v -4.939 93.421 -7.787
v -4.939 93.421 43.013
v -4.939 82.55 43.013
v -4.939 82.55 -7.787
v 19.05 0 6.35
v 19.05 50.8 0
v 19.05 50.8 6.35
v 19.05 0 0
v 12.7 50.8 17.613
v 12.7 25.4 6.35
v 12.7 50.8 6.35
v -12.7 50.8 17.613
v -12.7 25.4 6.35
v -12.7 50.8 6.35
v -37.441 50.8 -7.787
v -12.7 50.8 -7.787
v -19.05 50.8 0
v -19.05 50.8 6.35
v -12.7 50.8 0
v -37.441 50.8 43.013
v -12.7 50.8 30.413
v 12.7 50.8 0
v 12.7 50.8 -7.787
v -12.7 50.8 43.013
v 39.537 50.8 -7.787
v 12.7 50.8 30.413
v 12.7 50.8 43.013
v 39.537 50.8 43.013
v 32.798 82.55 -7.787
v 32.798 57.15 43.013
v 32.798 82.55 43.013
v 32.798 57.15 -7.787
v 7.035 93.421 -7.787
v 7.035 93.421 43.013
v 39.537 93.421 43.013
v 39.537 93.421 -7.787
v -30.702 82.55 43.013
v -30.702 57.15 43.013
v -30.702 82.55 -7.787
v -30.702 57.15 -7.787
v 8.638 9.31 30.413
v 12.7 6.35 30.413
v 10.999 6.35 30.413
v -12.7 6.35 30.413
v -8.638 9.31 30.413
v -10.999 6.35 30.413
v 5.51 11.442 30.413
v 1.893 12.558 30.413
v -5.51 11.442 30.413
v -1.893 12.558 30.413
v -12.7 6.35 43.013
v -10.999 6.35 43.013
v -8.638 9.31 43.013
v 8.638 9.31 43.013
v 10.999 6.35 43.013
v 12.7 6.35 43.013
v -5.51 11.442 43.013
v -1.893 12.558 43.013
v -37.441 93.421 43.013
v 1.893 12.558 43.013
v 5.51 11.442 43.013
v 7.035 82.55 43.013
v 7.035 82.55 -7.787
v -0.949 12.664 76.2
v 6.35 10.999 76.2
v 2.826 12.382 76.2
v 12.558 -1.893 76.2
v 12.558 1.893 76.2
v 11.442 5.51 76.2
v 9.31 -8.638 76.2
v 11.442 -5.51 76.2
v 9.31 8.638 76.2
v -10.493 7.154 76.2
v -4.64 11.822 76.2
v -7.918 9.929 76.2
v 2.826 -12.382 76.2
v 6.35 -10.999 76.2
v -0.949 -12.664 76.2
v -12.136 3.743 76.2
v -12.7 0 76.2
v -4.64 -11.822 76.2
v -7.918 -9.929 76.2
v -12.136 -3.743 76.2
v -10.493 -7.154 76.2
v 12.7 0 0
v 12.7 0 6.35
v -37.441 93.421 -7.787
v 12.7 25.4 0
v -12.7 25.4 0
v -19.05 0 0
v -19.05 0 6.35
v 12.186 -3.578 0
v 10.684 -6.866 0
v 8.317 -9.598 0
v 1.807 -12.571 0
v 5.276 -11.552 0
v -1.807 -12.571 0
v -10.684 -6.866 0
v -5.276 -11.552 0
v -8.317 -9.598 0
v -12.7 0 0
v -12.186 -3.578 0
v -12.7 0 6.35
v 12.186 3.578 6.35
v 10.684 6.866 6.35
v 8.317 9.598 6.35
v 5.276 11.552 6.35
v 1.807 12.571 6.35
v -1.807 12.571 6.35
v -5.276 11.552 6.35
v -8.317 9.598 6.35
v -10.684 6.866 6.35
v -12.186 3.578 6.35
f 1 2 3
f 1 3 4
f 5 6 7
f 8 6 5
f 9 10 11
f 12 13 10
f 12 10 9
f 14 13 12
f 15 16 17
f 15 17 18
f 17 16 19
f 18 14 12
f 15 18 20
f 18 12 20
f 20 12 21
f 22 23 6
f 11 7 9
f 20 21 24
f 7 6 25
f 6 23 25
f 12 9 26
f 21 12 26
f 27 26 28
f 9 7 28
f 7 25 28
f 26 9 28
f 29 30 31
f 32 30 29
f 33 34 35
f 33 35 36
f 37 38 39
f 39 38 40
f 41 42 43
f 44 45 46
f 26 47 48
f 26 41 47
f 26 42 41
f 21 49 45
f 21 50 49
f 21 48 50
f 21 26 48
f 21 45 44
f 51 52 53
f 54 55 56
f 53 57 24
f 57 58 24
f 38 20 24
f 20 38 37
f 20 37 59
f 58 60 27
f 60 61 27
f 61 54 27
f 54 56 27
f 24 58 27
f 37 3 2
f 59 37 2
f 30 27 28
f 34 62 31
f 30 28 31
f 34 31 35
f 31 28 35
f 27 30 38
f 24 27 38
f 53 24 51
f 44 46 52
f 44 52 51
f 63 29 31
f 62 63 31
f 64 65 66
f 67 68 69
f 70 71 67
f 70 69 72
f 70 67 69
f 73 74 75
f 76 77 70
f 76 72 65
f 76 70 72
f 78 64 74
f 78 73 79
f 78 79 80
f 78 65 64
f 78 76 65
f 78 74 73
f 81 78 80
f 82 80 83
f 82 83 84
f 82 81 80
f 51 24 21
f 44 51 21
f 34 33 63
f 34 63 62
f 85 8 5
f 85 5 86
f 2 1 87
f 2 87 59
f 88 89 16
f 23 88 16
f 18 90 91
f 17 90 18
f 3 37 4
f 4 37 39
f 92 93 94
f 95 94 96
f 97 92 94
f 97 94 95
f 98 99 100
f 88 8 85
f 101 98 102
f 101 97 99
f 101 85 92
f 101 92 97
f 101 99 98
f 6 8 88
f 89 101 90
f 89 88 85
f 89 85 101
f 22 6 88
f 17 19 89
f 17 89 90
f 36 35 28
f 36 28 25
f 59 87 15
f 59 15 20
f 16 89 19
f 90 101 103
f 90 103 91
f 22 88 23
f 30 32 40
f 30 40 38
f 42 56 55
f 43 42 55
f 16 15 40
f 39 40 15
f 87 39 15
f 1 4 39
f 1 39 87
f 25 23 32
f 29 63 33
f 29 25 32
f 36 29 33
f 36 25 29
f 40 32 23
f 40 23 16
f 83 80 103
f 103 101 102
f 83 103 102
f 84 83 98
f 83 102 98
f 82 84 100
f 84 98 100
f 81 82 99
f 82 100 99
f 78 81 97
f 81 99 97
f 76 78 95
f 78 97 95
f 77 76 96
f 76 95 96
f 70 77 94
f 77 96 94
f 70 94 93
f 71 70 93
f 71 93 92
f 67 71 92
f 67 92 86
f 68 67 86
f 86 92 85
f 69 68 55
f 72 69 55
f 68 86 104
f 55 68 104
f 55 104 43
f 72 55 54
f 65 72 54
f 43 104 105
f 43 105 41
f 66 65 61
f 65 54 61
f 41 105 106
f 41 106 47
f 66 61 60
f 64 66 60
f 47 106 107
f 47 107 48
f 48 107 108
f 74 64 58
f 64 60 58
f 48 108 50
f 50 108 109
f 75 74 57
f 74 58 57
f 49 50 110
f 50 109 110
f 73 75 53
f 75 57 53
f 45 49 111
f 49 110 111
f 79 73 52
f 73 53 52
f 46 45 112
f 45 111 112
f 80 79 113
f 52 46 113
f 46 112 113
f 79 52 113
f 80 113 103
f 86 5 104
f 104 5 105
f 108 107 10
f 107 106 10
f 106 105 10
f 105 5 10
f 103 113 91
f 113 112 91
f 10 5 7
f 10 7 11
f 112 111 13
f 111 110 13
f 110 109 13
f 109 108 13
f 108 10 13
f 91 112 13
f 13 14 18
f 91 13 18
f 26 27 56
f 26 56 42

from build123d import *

# Parameters (mm, degrees)
SKETCH3_R            = 12.7
BOSS_EXTRUDE1_DEPTH  = 76.2
BOSS_EXTRUDE2_DEPTH  = 6.35
SKETCH6_W            = 63.5
SKETCH6_H            = 50.8
BOSS_EXTRUDE3_DEPTH  = 6.35
SKETCH9_W            = 50.8
SKETCH9_H            = 6.35
BOSS_EXTRUDE4_DEPTH  = 0.38862
SKETCH10_W           = 0.38862
SKETCH10_H           = 50.8
BOSS_EXTRUDE5_DEPTH  = 25.4
SKETCH11_W           = 50.8
SKETCH11_H           = 6.35
BOSS_EXTRUDE6_DEPTH  = 0.38862
SKETCH13_W           = 0.38862
SKETCH13_H           = 50.8
BOSS_EXTRUDE7_DEPTH  = 25.4
SKETCH14_W           = 0.38862
SKETCH14_H           = 50.8
BOSS_EXTRUDE8_DEPTH  = 10.8712
SKETCH15_W           = 50.8
SKETCH15_H           = 10.8712
BOSS_EXTRUDE9_DEPTH  = 25.76322
SKETCH16_W           = 0.38862
SKETCH16_H           = 50.8
BOSS_EXTRUDE10_DEPTH = 10.8712
SKETCH17_W           = 50.8
SKETCH17_H           = 10.8712
BOSS_EXTRUDE11_DEPTH = 25.76322
RIB4_REACH           = 127.041
SKETCH21_WALL_W      = 279.8678728
SKETCH21_WALL_H      = 25.4
RIB15_REACH          = 127.041
SKETCH22_WALL_W      = 278.64922185
SKETCH22_WALL_H      = 25.4
SKETCH26_W           = 25.4
SKETCH26_H           = 12.600318116
BOSS_EXTRUDE12_DEPTH = 44.45
SKETCH27_W           = 50.8
SKETCH27_H           = 42.6212
BOSS_EXTRUDE13_DEPTH = 6.35
SKETCH28_W           = 50.8
SKETCH28_H           = 42.6212
BOSS_EXTRUDE14_DEPTH = 6.35


with BuildPart() as part:
    # Sketch3 → Boss-Extrude1 (new body)
    with BuildSketch(Plane.XY):
        with Locations(Location((0, 0, 0), (0, 0, 180))):
            Circle(SKETCH3_R)
    extrude(amount=BOSS_EXTRUDE1_DEPTH)

    # Sketch4 → Boss-Extrude2 (add)
    with BuildSketch(Plane(origin=(0, 0, 0), x_dir=(-1, 0, 0), z_dir=(0, 0, -1))):
        Polygon((0, 0), (19.05, 0), (19.05, 50.8), (-19.05, 50.8), (-19.05, 0), align=None)
    extrude(amount=-BOSS_EXTRUDE2_DEPTH)

    # Sketch6 → Boss-Extrude3 (add)
    with BuildSketch(Plane(origin=(0, 50.8, 0), x_dir=(1, 0, 0), z_dir=(0, 1, 0))):
        with Locations((1.04805825, -17.613482739)):
            Rectangle(SKETCH6_W, SKETCH6_H)
    extrude(amount=BOSS_EXTRUDE3_DEPTH)

    # Sketch9 → Boss-Extrude4 (add)
    with BuildSketch(Plane(origin=(32.79805825, 0, 0), x_dir=(0, 0, -1), z_dir=(1, 0, 0))):
        with Locations((-17.613482739, 53.975)):
            Rectangle(SKETCH9_W, SKETCH9_H)
    extrude(amount=BOSS_EXTRUDE4_DEPTH)

    # Sketch10 → Boss-Extrude5 (add)
    with BuildSketch(Plane(origin=(0, 57.15, 0), x_dir=(1, 0, 0), z_dir=(0, 1, 0))):
        with Locations((32.99236825, -17.613482739)):
            Rectangle(SKETCH10_W, SKETCH10_H)
    extrude(amount=BOSS_EXTRUDE5_DEPTH)

    # Sketch11 → Boss-Extrude6 (add)
    with BuildSketch(Plane.ZY.offset(30.70194175)):
        with Locations((17.613482739, 53.975)):
            Rectangle(SKETCH11_W, SKETCH11_H)
    extrude(amount=BOSS_EXTRUDE6_DEPTH)

    # Sketch13 → Boss-Extrude7 (add)
    with BuildSketch(Plane(origin=(0, 57.15, 0), x_dir=(1, 0, 0), z_dir=(0, 1, 0))):
        with Locations((-30.89625175, -17.613482739)):
            Rectangle(SKETCH13_W, SKETCH13_H)
    extrude(amount=BOSS_EXTRUDE7_DEPTH)

    # Sketch14 → Boss-Extrude8 (add)
    with BuildSketch(Plane(origin=(0, 82.55, 0), x_dir=(1, 0, 0), z_dir=(0, 1, 0))):
        with Locations((-30.89625175, -17.613482739)):
            Rectangle(SKETCH14_W, SKETCH14_H)
    extrude(amount=BOSS_EXTRUDE8_DEPTH)

    # Sketch15 → Boss-Extrude9 (add)
    with BuildSketch(Plane(origin=(-30.70194175, 0, 0), x_dir=(0, 0, -1), z_dir=(1, 0, 0))):
        with Locations((-17.613482739, 87.9856)):
            Rectangle(SKETCH15_W, SKETCH15_H)
    extrude(amount=BOSS_EXTRUDE9_DEPTH)

    # Sketch16 → Boss-Extrude10 (add)
    with BuildSketch(Plane(origin=(0, 82.55, 0), x_dir=(1, 0, 0), z_dir=(0, 1, 0))):
        with Locations((32.99236825, -17.613482739)):
            Rectangle(SKETCH16_W, SKETCH16_H)
    extrude(amount=BOSS_EXTRUDE10_DEPTH)

    # Sketch17 → Boss-Extrude11 (add)
    with BuildSketch(Plane.ZY.offset(-32.79805825)):
        with Locations((17.613482739, 87.9856)):
            Rectangle(SKETCH17_W, SKETCH17_H)
    extrude(amount=BOSS_EXTRUDE11_DEPTH)

    # Sketch21 wall → Rib4 (add, up to next)
    with BuildSketch(Plane(origin=(0, 38.1, 11.981741369), x_dir=(0, 0.914150584151, 0.405374776592), z_dir=(0, -0.405374776592, 0.914150584151)), mode=Mode.PRIVATE) as rib4_sk1:
        Rectangle(SKETCH21_WALL_W, SKETCH21_WALL_H)
    rib4_tool1 = extrude(rib4_sk1.sketch, amount=-RIB4_REACH, mode=Mode.PRIVATE) - part.part
    add(rib4_tool1.solids().sort_by_distance((0, 38.1, 11.981741369))[0])

    # Sketch22 wall → Rib15 (add, up to next)
    with BuildSketch(Plane(origin=(0, 38.1, -3.893258631), x_dir=(0, 0.956083915685, -0.293093067419), z_dir=(0, 0.293093067419, 0.956083915685)), mode=Mode.PRIVATE) as rib15_sk1:
        Rectangle(SKETCH22_WALL_W, SKETCH22_WALL_H)
    rib15_tool1 = extrude(rib15_sk1.sketch, amount=RIB15_REACH, mode=Mode.PRIVATE) - part.part
    add(rib15_tool1.solids().sort_by_distance((0, 38.1, -3.893258631))[0])

    # Sketch26 → Boss-Extrude12 (add)
    with BuildSketch(Plane(origin=(0, 50.8, 0), x_dir=(-1, 0, 0), z_dir=(0, -1, 0))):
        with Locations((0, -36.713323681)):
            Rectangle(SKETCH26_W, SKETCH26_H)
    extrude(amount=BOSS_EXTRUDE12_DEPTH)

    # Sketch27 → Boss-Extrude13 (add)
    with BuildSketch(Plane(origin=(33.18667825, 0, 0), x_dir=(0, 0, -1), z_dir=(1, 0, 0))):
        with Locations((-17.613482739, 72.1106)):
            Rectangle(SKETCH27_W, SKETCH27_H)
    extrude(amount=BOSS_EXTRUDE13_DEPTH)

    # Sketch28 → Boss-Extrude14 (add)
    with BuildSketch(Plane.ZY.offset(31.09056175)):
        with Locations((17.613482739, 72.1106)):
            Rectangle(SKETCH28_W, SKETCH28_H)
    extrude(amount=BOSS_EXTRUDE14_DEPTH)


solid = part.part
